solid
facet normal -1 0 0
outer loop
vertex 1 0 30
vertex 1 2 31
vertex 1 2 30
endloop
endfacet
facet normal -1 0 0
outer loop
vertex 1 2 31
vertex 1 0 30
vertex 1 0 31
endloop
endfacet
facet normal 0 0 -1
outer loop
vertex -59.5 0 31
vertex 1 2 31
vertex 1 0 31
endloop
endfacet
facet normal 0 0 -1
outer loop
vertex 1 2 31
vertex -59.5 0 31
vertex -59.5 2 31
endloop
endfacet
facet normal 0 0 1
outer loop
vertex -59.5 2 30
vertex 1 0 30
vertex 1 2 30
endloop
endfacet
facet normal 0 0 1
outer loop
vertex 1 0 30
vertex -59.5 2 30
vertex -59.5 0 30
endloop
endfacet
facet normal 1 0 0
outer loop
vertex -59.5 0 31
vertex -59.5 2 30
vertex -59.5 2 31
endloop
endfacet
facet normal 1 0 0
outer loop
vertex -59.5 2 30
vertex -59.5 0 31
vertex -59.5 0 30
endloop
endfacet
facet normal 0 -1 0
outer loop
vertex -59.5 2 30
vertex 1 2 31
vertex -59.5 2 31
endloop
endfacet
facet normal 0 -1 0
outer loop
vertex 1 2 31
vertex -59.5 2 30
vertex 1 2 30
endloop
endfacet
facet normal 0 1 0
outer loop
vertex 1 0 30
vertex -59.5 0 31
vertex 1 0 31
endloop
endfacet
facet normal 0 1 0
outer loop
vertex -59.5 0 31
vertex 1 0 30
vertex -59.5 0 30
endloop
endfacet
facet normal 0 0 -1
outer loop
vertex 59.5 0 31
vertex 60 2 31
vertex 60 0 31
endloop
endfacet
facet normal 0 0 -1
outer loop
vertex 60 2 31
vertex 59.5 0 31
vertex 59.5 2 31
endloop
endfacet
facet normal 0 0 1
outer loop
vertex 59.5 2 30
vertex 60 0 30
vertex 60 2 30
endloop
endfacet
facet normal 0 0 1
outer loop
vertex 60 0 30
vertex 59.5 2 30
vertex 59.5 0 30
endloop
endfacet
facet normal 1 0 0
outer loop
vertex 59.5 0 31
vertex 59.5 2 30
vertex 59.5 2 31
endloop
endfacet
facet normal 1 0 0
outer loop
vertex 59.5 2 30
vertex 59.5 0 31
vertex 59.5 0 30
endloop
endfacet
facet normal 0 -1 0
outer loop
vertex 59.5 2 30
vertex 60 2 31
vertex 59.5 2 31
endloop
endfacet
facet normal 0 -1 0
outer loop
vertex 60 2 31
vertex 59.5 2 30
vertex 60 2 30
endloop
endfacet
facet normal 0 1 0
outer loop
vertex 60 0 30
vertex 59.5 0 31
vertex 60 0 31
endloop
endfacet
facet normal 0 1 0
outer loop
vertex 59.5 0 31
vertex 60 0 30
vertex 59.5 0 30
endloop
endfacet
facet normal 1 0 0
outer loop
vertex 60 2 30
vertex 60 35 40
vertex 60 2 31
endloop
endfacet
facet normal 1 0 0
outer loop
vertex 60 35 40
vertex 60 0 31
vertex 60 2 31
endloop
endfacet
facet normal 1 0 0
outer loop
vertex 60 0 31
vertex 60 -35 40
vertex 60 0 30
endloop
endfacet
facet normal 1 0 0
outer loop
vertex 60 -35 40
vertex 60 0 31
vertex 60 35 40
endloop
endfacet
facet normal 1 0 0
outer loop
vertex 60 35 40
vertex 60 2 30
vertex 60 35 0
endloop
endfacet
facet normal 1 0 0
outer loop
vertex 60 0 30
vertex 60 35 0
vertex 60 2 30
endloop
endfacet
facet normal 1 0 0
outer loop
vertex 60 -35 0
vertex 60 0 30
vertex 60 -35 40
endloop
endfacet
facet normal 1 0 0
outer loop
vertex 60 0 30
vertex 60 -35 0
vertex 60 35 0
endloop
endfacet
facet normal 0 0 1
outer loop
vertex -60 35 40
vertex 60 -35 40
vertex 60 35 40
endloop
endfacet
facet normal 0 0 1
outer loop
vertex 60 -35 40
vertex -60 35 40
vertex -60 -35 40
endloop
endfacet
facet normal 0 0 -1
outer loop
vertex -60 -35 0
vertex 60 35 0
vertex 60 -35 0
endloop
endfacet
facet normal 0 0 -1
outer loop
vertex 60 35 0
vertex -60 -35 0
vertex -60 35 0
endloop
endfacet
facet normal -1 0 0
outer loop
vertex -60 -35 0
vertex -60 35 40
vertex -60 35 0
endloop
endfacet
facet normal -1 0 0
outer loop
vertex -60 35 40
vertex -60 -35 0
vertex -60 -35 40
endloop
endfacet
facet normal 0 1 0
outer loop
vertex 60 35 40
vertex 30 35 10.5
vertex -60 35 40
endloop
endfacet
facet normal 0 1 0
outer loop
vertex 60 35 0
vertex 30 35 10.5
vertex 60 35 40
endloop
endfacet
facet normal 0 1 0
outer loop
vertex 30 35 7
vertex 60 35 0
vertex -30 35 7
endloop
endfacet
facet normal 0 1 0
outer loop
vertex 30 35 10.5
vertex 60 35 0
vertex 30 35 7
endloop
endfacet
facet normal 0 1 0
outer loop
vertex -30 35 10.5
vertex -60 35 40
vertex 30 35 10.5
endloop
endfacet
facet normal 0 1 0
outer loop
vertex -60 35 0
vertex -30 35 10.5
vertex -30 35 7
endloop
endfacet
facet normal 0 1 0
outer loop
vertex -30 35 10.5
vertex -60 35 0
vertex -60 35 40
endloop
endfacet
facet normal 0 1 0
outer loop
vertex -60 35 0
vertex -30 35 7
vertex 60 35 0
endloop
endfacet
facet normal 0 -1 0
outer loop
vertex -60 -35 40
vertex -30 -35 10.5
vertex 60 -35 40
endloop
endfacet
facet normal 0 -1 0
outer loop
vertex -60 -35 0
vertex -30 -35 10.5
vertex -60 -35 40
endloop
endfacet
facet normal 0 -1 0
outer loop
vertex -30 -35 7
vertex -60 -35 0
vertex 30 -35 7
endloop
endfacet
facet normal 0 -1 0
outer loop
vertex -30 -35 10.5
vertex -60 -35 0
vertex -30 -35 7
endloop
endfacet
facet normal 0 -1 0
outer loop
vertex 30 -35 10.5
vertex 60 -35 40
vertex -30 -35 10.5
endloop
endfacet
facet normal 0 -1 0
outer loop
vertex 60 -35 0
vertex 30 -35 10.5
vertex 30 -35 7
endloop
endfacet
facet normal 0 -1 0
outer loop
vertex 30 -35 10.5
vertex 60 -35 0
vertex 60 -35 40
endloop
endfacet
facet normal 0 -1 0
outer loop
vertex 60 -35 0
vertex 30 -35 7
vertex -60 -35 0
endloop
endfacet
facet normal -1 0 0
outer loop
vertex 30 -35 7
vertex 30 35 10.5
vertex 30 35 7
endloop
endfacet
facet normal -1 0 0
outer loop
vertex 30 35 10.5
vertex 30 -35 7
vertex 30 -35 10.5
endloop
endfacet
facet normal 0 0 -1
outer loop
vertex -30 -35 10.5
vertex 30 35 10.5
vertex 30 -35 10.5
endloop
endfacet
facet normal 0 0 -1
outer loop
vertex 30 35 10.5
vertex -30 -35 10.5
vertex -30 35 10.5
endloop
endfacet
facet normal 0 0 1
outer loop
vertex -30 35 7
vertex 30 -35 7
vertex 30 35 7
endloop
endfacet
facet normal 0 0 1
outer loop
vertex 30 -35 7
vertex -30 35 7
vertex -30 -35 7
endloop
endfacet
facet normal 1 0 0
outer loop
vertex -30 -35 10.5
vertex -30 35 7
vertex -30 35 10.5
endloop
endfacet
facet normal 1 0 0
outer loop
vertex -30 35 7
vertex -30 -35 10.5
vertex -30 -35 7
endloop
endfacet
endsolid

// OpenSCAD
// Mini horizontal gel-electrophoresis box - buffer tank
// Print orientation: open top facing up (+Z), resting on XY plane at z = 0

// ---------------- Parameters ----------------
tank_x      = 120;   // outer length along X (mm)
tank_y      = 70;    // outer width along Y (mm)
tank_h      = 40;    // outer height along Z (mm)

wall        = 3;     // wall thickness (mm)
floor       = 3;     // floor thickness (mm)

platform_x  = 60;    // platform length along X (mm), centred
platform_y  = tank_y; // platform spans full inner width (mm)
platform_top = 10;   // platform top height above tank floor (mm)
// Note: platform_top is absolute height in the model (floor is at z = 0)

hole_d      = 2;     // electrode hole diameter (mm)
hole_y      = 0;     // electrode hole Y position (mm)
hole_z      = 30;    // electrode hole Z position (mm)

eps         = 0.5;   // cutter overshoot past faces (mm)

$fn = 96;

// ---------------- Derived ----------------
inner_x = tank_x - 2 * wall;   // inner length along X
inner_y = tank_y - 2 * wall;   // inner width along Y
// platform sits on the floor, centred along X, full width in Y

// ---------------- Model ----------------
difference() {
    // Main tank body (open top)
    translate([-tank_x / 2, -tank_y / 2, 0])
        cube([tank_x, tank_y, tank_h]);

    // Raised platform for gel tray
    translate([-platform_x / 2, -platform_y / 2, platform_top - floor])
        cube([platform_x, platform_y, floor + eps]);  // extends into tank

    // Horizontal electrode holes through each end wall, along X
    for (s = [-1, 1])
        translate([s * (tank_x / 2 - eps), hole_y, hole_z])
            cube([tank_x / 2 + eps, hole_d, 1]);  // runs through the end wall
}
